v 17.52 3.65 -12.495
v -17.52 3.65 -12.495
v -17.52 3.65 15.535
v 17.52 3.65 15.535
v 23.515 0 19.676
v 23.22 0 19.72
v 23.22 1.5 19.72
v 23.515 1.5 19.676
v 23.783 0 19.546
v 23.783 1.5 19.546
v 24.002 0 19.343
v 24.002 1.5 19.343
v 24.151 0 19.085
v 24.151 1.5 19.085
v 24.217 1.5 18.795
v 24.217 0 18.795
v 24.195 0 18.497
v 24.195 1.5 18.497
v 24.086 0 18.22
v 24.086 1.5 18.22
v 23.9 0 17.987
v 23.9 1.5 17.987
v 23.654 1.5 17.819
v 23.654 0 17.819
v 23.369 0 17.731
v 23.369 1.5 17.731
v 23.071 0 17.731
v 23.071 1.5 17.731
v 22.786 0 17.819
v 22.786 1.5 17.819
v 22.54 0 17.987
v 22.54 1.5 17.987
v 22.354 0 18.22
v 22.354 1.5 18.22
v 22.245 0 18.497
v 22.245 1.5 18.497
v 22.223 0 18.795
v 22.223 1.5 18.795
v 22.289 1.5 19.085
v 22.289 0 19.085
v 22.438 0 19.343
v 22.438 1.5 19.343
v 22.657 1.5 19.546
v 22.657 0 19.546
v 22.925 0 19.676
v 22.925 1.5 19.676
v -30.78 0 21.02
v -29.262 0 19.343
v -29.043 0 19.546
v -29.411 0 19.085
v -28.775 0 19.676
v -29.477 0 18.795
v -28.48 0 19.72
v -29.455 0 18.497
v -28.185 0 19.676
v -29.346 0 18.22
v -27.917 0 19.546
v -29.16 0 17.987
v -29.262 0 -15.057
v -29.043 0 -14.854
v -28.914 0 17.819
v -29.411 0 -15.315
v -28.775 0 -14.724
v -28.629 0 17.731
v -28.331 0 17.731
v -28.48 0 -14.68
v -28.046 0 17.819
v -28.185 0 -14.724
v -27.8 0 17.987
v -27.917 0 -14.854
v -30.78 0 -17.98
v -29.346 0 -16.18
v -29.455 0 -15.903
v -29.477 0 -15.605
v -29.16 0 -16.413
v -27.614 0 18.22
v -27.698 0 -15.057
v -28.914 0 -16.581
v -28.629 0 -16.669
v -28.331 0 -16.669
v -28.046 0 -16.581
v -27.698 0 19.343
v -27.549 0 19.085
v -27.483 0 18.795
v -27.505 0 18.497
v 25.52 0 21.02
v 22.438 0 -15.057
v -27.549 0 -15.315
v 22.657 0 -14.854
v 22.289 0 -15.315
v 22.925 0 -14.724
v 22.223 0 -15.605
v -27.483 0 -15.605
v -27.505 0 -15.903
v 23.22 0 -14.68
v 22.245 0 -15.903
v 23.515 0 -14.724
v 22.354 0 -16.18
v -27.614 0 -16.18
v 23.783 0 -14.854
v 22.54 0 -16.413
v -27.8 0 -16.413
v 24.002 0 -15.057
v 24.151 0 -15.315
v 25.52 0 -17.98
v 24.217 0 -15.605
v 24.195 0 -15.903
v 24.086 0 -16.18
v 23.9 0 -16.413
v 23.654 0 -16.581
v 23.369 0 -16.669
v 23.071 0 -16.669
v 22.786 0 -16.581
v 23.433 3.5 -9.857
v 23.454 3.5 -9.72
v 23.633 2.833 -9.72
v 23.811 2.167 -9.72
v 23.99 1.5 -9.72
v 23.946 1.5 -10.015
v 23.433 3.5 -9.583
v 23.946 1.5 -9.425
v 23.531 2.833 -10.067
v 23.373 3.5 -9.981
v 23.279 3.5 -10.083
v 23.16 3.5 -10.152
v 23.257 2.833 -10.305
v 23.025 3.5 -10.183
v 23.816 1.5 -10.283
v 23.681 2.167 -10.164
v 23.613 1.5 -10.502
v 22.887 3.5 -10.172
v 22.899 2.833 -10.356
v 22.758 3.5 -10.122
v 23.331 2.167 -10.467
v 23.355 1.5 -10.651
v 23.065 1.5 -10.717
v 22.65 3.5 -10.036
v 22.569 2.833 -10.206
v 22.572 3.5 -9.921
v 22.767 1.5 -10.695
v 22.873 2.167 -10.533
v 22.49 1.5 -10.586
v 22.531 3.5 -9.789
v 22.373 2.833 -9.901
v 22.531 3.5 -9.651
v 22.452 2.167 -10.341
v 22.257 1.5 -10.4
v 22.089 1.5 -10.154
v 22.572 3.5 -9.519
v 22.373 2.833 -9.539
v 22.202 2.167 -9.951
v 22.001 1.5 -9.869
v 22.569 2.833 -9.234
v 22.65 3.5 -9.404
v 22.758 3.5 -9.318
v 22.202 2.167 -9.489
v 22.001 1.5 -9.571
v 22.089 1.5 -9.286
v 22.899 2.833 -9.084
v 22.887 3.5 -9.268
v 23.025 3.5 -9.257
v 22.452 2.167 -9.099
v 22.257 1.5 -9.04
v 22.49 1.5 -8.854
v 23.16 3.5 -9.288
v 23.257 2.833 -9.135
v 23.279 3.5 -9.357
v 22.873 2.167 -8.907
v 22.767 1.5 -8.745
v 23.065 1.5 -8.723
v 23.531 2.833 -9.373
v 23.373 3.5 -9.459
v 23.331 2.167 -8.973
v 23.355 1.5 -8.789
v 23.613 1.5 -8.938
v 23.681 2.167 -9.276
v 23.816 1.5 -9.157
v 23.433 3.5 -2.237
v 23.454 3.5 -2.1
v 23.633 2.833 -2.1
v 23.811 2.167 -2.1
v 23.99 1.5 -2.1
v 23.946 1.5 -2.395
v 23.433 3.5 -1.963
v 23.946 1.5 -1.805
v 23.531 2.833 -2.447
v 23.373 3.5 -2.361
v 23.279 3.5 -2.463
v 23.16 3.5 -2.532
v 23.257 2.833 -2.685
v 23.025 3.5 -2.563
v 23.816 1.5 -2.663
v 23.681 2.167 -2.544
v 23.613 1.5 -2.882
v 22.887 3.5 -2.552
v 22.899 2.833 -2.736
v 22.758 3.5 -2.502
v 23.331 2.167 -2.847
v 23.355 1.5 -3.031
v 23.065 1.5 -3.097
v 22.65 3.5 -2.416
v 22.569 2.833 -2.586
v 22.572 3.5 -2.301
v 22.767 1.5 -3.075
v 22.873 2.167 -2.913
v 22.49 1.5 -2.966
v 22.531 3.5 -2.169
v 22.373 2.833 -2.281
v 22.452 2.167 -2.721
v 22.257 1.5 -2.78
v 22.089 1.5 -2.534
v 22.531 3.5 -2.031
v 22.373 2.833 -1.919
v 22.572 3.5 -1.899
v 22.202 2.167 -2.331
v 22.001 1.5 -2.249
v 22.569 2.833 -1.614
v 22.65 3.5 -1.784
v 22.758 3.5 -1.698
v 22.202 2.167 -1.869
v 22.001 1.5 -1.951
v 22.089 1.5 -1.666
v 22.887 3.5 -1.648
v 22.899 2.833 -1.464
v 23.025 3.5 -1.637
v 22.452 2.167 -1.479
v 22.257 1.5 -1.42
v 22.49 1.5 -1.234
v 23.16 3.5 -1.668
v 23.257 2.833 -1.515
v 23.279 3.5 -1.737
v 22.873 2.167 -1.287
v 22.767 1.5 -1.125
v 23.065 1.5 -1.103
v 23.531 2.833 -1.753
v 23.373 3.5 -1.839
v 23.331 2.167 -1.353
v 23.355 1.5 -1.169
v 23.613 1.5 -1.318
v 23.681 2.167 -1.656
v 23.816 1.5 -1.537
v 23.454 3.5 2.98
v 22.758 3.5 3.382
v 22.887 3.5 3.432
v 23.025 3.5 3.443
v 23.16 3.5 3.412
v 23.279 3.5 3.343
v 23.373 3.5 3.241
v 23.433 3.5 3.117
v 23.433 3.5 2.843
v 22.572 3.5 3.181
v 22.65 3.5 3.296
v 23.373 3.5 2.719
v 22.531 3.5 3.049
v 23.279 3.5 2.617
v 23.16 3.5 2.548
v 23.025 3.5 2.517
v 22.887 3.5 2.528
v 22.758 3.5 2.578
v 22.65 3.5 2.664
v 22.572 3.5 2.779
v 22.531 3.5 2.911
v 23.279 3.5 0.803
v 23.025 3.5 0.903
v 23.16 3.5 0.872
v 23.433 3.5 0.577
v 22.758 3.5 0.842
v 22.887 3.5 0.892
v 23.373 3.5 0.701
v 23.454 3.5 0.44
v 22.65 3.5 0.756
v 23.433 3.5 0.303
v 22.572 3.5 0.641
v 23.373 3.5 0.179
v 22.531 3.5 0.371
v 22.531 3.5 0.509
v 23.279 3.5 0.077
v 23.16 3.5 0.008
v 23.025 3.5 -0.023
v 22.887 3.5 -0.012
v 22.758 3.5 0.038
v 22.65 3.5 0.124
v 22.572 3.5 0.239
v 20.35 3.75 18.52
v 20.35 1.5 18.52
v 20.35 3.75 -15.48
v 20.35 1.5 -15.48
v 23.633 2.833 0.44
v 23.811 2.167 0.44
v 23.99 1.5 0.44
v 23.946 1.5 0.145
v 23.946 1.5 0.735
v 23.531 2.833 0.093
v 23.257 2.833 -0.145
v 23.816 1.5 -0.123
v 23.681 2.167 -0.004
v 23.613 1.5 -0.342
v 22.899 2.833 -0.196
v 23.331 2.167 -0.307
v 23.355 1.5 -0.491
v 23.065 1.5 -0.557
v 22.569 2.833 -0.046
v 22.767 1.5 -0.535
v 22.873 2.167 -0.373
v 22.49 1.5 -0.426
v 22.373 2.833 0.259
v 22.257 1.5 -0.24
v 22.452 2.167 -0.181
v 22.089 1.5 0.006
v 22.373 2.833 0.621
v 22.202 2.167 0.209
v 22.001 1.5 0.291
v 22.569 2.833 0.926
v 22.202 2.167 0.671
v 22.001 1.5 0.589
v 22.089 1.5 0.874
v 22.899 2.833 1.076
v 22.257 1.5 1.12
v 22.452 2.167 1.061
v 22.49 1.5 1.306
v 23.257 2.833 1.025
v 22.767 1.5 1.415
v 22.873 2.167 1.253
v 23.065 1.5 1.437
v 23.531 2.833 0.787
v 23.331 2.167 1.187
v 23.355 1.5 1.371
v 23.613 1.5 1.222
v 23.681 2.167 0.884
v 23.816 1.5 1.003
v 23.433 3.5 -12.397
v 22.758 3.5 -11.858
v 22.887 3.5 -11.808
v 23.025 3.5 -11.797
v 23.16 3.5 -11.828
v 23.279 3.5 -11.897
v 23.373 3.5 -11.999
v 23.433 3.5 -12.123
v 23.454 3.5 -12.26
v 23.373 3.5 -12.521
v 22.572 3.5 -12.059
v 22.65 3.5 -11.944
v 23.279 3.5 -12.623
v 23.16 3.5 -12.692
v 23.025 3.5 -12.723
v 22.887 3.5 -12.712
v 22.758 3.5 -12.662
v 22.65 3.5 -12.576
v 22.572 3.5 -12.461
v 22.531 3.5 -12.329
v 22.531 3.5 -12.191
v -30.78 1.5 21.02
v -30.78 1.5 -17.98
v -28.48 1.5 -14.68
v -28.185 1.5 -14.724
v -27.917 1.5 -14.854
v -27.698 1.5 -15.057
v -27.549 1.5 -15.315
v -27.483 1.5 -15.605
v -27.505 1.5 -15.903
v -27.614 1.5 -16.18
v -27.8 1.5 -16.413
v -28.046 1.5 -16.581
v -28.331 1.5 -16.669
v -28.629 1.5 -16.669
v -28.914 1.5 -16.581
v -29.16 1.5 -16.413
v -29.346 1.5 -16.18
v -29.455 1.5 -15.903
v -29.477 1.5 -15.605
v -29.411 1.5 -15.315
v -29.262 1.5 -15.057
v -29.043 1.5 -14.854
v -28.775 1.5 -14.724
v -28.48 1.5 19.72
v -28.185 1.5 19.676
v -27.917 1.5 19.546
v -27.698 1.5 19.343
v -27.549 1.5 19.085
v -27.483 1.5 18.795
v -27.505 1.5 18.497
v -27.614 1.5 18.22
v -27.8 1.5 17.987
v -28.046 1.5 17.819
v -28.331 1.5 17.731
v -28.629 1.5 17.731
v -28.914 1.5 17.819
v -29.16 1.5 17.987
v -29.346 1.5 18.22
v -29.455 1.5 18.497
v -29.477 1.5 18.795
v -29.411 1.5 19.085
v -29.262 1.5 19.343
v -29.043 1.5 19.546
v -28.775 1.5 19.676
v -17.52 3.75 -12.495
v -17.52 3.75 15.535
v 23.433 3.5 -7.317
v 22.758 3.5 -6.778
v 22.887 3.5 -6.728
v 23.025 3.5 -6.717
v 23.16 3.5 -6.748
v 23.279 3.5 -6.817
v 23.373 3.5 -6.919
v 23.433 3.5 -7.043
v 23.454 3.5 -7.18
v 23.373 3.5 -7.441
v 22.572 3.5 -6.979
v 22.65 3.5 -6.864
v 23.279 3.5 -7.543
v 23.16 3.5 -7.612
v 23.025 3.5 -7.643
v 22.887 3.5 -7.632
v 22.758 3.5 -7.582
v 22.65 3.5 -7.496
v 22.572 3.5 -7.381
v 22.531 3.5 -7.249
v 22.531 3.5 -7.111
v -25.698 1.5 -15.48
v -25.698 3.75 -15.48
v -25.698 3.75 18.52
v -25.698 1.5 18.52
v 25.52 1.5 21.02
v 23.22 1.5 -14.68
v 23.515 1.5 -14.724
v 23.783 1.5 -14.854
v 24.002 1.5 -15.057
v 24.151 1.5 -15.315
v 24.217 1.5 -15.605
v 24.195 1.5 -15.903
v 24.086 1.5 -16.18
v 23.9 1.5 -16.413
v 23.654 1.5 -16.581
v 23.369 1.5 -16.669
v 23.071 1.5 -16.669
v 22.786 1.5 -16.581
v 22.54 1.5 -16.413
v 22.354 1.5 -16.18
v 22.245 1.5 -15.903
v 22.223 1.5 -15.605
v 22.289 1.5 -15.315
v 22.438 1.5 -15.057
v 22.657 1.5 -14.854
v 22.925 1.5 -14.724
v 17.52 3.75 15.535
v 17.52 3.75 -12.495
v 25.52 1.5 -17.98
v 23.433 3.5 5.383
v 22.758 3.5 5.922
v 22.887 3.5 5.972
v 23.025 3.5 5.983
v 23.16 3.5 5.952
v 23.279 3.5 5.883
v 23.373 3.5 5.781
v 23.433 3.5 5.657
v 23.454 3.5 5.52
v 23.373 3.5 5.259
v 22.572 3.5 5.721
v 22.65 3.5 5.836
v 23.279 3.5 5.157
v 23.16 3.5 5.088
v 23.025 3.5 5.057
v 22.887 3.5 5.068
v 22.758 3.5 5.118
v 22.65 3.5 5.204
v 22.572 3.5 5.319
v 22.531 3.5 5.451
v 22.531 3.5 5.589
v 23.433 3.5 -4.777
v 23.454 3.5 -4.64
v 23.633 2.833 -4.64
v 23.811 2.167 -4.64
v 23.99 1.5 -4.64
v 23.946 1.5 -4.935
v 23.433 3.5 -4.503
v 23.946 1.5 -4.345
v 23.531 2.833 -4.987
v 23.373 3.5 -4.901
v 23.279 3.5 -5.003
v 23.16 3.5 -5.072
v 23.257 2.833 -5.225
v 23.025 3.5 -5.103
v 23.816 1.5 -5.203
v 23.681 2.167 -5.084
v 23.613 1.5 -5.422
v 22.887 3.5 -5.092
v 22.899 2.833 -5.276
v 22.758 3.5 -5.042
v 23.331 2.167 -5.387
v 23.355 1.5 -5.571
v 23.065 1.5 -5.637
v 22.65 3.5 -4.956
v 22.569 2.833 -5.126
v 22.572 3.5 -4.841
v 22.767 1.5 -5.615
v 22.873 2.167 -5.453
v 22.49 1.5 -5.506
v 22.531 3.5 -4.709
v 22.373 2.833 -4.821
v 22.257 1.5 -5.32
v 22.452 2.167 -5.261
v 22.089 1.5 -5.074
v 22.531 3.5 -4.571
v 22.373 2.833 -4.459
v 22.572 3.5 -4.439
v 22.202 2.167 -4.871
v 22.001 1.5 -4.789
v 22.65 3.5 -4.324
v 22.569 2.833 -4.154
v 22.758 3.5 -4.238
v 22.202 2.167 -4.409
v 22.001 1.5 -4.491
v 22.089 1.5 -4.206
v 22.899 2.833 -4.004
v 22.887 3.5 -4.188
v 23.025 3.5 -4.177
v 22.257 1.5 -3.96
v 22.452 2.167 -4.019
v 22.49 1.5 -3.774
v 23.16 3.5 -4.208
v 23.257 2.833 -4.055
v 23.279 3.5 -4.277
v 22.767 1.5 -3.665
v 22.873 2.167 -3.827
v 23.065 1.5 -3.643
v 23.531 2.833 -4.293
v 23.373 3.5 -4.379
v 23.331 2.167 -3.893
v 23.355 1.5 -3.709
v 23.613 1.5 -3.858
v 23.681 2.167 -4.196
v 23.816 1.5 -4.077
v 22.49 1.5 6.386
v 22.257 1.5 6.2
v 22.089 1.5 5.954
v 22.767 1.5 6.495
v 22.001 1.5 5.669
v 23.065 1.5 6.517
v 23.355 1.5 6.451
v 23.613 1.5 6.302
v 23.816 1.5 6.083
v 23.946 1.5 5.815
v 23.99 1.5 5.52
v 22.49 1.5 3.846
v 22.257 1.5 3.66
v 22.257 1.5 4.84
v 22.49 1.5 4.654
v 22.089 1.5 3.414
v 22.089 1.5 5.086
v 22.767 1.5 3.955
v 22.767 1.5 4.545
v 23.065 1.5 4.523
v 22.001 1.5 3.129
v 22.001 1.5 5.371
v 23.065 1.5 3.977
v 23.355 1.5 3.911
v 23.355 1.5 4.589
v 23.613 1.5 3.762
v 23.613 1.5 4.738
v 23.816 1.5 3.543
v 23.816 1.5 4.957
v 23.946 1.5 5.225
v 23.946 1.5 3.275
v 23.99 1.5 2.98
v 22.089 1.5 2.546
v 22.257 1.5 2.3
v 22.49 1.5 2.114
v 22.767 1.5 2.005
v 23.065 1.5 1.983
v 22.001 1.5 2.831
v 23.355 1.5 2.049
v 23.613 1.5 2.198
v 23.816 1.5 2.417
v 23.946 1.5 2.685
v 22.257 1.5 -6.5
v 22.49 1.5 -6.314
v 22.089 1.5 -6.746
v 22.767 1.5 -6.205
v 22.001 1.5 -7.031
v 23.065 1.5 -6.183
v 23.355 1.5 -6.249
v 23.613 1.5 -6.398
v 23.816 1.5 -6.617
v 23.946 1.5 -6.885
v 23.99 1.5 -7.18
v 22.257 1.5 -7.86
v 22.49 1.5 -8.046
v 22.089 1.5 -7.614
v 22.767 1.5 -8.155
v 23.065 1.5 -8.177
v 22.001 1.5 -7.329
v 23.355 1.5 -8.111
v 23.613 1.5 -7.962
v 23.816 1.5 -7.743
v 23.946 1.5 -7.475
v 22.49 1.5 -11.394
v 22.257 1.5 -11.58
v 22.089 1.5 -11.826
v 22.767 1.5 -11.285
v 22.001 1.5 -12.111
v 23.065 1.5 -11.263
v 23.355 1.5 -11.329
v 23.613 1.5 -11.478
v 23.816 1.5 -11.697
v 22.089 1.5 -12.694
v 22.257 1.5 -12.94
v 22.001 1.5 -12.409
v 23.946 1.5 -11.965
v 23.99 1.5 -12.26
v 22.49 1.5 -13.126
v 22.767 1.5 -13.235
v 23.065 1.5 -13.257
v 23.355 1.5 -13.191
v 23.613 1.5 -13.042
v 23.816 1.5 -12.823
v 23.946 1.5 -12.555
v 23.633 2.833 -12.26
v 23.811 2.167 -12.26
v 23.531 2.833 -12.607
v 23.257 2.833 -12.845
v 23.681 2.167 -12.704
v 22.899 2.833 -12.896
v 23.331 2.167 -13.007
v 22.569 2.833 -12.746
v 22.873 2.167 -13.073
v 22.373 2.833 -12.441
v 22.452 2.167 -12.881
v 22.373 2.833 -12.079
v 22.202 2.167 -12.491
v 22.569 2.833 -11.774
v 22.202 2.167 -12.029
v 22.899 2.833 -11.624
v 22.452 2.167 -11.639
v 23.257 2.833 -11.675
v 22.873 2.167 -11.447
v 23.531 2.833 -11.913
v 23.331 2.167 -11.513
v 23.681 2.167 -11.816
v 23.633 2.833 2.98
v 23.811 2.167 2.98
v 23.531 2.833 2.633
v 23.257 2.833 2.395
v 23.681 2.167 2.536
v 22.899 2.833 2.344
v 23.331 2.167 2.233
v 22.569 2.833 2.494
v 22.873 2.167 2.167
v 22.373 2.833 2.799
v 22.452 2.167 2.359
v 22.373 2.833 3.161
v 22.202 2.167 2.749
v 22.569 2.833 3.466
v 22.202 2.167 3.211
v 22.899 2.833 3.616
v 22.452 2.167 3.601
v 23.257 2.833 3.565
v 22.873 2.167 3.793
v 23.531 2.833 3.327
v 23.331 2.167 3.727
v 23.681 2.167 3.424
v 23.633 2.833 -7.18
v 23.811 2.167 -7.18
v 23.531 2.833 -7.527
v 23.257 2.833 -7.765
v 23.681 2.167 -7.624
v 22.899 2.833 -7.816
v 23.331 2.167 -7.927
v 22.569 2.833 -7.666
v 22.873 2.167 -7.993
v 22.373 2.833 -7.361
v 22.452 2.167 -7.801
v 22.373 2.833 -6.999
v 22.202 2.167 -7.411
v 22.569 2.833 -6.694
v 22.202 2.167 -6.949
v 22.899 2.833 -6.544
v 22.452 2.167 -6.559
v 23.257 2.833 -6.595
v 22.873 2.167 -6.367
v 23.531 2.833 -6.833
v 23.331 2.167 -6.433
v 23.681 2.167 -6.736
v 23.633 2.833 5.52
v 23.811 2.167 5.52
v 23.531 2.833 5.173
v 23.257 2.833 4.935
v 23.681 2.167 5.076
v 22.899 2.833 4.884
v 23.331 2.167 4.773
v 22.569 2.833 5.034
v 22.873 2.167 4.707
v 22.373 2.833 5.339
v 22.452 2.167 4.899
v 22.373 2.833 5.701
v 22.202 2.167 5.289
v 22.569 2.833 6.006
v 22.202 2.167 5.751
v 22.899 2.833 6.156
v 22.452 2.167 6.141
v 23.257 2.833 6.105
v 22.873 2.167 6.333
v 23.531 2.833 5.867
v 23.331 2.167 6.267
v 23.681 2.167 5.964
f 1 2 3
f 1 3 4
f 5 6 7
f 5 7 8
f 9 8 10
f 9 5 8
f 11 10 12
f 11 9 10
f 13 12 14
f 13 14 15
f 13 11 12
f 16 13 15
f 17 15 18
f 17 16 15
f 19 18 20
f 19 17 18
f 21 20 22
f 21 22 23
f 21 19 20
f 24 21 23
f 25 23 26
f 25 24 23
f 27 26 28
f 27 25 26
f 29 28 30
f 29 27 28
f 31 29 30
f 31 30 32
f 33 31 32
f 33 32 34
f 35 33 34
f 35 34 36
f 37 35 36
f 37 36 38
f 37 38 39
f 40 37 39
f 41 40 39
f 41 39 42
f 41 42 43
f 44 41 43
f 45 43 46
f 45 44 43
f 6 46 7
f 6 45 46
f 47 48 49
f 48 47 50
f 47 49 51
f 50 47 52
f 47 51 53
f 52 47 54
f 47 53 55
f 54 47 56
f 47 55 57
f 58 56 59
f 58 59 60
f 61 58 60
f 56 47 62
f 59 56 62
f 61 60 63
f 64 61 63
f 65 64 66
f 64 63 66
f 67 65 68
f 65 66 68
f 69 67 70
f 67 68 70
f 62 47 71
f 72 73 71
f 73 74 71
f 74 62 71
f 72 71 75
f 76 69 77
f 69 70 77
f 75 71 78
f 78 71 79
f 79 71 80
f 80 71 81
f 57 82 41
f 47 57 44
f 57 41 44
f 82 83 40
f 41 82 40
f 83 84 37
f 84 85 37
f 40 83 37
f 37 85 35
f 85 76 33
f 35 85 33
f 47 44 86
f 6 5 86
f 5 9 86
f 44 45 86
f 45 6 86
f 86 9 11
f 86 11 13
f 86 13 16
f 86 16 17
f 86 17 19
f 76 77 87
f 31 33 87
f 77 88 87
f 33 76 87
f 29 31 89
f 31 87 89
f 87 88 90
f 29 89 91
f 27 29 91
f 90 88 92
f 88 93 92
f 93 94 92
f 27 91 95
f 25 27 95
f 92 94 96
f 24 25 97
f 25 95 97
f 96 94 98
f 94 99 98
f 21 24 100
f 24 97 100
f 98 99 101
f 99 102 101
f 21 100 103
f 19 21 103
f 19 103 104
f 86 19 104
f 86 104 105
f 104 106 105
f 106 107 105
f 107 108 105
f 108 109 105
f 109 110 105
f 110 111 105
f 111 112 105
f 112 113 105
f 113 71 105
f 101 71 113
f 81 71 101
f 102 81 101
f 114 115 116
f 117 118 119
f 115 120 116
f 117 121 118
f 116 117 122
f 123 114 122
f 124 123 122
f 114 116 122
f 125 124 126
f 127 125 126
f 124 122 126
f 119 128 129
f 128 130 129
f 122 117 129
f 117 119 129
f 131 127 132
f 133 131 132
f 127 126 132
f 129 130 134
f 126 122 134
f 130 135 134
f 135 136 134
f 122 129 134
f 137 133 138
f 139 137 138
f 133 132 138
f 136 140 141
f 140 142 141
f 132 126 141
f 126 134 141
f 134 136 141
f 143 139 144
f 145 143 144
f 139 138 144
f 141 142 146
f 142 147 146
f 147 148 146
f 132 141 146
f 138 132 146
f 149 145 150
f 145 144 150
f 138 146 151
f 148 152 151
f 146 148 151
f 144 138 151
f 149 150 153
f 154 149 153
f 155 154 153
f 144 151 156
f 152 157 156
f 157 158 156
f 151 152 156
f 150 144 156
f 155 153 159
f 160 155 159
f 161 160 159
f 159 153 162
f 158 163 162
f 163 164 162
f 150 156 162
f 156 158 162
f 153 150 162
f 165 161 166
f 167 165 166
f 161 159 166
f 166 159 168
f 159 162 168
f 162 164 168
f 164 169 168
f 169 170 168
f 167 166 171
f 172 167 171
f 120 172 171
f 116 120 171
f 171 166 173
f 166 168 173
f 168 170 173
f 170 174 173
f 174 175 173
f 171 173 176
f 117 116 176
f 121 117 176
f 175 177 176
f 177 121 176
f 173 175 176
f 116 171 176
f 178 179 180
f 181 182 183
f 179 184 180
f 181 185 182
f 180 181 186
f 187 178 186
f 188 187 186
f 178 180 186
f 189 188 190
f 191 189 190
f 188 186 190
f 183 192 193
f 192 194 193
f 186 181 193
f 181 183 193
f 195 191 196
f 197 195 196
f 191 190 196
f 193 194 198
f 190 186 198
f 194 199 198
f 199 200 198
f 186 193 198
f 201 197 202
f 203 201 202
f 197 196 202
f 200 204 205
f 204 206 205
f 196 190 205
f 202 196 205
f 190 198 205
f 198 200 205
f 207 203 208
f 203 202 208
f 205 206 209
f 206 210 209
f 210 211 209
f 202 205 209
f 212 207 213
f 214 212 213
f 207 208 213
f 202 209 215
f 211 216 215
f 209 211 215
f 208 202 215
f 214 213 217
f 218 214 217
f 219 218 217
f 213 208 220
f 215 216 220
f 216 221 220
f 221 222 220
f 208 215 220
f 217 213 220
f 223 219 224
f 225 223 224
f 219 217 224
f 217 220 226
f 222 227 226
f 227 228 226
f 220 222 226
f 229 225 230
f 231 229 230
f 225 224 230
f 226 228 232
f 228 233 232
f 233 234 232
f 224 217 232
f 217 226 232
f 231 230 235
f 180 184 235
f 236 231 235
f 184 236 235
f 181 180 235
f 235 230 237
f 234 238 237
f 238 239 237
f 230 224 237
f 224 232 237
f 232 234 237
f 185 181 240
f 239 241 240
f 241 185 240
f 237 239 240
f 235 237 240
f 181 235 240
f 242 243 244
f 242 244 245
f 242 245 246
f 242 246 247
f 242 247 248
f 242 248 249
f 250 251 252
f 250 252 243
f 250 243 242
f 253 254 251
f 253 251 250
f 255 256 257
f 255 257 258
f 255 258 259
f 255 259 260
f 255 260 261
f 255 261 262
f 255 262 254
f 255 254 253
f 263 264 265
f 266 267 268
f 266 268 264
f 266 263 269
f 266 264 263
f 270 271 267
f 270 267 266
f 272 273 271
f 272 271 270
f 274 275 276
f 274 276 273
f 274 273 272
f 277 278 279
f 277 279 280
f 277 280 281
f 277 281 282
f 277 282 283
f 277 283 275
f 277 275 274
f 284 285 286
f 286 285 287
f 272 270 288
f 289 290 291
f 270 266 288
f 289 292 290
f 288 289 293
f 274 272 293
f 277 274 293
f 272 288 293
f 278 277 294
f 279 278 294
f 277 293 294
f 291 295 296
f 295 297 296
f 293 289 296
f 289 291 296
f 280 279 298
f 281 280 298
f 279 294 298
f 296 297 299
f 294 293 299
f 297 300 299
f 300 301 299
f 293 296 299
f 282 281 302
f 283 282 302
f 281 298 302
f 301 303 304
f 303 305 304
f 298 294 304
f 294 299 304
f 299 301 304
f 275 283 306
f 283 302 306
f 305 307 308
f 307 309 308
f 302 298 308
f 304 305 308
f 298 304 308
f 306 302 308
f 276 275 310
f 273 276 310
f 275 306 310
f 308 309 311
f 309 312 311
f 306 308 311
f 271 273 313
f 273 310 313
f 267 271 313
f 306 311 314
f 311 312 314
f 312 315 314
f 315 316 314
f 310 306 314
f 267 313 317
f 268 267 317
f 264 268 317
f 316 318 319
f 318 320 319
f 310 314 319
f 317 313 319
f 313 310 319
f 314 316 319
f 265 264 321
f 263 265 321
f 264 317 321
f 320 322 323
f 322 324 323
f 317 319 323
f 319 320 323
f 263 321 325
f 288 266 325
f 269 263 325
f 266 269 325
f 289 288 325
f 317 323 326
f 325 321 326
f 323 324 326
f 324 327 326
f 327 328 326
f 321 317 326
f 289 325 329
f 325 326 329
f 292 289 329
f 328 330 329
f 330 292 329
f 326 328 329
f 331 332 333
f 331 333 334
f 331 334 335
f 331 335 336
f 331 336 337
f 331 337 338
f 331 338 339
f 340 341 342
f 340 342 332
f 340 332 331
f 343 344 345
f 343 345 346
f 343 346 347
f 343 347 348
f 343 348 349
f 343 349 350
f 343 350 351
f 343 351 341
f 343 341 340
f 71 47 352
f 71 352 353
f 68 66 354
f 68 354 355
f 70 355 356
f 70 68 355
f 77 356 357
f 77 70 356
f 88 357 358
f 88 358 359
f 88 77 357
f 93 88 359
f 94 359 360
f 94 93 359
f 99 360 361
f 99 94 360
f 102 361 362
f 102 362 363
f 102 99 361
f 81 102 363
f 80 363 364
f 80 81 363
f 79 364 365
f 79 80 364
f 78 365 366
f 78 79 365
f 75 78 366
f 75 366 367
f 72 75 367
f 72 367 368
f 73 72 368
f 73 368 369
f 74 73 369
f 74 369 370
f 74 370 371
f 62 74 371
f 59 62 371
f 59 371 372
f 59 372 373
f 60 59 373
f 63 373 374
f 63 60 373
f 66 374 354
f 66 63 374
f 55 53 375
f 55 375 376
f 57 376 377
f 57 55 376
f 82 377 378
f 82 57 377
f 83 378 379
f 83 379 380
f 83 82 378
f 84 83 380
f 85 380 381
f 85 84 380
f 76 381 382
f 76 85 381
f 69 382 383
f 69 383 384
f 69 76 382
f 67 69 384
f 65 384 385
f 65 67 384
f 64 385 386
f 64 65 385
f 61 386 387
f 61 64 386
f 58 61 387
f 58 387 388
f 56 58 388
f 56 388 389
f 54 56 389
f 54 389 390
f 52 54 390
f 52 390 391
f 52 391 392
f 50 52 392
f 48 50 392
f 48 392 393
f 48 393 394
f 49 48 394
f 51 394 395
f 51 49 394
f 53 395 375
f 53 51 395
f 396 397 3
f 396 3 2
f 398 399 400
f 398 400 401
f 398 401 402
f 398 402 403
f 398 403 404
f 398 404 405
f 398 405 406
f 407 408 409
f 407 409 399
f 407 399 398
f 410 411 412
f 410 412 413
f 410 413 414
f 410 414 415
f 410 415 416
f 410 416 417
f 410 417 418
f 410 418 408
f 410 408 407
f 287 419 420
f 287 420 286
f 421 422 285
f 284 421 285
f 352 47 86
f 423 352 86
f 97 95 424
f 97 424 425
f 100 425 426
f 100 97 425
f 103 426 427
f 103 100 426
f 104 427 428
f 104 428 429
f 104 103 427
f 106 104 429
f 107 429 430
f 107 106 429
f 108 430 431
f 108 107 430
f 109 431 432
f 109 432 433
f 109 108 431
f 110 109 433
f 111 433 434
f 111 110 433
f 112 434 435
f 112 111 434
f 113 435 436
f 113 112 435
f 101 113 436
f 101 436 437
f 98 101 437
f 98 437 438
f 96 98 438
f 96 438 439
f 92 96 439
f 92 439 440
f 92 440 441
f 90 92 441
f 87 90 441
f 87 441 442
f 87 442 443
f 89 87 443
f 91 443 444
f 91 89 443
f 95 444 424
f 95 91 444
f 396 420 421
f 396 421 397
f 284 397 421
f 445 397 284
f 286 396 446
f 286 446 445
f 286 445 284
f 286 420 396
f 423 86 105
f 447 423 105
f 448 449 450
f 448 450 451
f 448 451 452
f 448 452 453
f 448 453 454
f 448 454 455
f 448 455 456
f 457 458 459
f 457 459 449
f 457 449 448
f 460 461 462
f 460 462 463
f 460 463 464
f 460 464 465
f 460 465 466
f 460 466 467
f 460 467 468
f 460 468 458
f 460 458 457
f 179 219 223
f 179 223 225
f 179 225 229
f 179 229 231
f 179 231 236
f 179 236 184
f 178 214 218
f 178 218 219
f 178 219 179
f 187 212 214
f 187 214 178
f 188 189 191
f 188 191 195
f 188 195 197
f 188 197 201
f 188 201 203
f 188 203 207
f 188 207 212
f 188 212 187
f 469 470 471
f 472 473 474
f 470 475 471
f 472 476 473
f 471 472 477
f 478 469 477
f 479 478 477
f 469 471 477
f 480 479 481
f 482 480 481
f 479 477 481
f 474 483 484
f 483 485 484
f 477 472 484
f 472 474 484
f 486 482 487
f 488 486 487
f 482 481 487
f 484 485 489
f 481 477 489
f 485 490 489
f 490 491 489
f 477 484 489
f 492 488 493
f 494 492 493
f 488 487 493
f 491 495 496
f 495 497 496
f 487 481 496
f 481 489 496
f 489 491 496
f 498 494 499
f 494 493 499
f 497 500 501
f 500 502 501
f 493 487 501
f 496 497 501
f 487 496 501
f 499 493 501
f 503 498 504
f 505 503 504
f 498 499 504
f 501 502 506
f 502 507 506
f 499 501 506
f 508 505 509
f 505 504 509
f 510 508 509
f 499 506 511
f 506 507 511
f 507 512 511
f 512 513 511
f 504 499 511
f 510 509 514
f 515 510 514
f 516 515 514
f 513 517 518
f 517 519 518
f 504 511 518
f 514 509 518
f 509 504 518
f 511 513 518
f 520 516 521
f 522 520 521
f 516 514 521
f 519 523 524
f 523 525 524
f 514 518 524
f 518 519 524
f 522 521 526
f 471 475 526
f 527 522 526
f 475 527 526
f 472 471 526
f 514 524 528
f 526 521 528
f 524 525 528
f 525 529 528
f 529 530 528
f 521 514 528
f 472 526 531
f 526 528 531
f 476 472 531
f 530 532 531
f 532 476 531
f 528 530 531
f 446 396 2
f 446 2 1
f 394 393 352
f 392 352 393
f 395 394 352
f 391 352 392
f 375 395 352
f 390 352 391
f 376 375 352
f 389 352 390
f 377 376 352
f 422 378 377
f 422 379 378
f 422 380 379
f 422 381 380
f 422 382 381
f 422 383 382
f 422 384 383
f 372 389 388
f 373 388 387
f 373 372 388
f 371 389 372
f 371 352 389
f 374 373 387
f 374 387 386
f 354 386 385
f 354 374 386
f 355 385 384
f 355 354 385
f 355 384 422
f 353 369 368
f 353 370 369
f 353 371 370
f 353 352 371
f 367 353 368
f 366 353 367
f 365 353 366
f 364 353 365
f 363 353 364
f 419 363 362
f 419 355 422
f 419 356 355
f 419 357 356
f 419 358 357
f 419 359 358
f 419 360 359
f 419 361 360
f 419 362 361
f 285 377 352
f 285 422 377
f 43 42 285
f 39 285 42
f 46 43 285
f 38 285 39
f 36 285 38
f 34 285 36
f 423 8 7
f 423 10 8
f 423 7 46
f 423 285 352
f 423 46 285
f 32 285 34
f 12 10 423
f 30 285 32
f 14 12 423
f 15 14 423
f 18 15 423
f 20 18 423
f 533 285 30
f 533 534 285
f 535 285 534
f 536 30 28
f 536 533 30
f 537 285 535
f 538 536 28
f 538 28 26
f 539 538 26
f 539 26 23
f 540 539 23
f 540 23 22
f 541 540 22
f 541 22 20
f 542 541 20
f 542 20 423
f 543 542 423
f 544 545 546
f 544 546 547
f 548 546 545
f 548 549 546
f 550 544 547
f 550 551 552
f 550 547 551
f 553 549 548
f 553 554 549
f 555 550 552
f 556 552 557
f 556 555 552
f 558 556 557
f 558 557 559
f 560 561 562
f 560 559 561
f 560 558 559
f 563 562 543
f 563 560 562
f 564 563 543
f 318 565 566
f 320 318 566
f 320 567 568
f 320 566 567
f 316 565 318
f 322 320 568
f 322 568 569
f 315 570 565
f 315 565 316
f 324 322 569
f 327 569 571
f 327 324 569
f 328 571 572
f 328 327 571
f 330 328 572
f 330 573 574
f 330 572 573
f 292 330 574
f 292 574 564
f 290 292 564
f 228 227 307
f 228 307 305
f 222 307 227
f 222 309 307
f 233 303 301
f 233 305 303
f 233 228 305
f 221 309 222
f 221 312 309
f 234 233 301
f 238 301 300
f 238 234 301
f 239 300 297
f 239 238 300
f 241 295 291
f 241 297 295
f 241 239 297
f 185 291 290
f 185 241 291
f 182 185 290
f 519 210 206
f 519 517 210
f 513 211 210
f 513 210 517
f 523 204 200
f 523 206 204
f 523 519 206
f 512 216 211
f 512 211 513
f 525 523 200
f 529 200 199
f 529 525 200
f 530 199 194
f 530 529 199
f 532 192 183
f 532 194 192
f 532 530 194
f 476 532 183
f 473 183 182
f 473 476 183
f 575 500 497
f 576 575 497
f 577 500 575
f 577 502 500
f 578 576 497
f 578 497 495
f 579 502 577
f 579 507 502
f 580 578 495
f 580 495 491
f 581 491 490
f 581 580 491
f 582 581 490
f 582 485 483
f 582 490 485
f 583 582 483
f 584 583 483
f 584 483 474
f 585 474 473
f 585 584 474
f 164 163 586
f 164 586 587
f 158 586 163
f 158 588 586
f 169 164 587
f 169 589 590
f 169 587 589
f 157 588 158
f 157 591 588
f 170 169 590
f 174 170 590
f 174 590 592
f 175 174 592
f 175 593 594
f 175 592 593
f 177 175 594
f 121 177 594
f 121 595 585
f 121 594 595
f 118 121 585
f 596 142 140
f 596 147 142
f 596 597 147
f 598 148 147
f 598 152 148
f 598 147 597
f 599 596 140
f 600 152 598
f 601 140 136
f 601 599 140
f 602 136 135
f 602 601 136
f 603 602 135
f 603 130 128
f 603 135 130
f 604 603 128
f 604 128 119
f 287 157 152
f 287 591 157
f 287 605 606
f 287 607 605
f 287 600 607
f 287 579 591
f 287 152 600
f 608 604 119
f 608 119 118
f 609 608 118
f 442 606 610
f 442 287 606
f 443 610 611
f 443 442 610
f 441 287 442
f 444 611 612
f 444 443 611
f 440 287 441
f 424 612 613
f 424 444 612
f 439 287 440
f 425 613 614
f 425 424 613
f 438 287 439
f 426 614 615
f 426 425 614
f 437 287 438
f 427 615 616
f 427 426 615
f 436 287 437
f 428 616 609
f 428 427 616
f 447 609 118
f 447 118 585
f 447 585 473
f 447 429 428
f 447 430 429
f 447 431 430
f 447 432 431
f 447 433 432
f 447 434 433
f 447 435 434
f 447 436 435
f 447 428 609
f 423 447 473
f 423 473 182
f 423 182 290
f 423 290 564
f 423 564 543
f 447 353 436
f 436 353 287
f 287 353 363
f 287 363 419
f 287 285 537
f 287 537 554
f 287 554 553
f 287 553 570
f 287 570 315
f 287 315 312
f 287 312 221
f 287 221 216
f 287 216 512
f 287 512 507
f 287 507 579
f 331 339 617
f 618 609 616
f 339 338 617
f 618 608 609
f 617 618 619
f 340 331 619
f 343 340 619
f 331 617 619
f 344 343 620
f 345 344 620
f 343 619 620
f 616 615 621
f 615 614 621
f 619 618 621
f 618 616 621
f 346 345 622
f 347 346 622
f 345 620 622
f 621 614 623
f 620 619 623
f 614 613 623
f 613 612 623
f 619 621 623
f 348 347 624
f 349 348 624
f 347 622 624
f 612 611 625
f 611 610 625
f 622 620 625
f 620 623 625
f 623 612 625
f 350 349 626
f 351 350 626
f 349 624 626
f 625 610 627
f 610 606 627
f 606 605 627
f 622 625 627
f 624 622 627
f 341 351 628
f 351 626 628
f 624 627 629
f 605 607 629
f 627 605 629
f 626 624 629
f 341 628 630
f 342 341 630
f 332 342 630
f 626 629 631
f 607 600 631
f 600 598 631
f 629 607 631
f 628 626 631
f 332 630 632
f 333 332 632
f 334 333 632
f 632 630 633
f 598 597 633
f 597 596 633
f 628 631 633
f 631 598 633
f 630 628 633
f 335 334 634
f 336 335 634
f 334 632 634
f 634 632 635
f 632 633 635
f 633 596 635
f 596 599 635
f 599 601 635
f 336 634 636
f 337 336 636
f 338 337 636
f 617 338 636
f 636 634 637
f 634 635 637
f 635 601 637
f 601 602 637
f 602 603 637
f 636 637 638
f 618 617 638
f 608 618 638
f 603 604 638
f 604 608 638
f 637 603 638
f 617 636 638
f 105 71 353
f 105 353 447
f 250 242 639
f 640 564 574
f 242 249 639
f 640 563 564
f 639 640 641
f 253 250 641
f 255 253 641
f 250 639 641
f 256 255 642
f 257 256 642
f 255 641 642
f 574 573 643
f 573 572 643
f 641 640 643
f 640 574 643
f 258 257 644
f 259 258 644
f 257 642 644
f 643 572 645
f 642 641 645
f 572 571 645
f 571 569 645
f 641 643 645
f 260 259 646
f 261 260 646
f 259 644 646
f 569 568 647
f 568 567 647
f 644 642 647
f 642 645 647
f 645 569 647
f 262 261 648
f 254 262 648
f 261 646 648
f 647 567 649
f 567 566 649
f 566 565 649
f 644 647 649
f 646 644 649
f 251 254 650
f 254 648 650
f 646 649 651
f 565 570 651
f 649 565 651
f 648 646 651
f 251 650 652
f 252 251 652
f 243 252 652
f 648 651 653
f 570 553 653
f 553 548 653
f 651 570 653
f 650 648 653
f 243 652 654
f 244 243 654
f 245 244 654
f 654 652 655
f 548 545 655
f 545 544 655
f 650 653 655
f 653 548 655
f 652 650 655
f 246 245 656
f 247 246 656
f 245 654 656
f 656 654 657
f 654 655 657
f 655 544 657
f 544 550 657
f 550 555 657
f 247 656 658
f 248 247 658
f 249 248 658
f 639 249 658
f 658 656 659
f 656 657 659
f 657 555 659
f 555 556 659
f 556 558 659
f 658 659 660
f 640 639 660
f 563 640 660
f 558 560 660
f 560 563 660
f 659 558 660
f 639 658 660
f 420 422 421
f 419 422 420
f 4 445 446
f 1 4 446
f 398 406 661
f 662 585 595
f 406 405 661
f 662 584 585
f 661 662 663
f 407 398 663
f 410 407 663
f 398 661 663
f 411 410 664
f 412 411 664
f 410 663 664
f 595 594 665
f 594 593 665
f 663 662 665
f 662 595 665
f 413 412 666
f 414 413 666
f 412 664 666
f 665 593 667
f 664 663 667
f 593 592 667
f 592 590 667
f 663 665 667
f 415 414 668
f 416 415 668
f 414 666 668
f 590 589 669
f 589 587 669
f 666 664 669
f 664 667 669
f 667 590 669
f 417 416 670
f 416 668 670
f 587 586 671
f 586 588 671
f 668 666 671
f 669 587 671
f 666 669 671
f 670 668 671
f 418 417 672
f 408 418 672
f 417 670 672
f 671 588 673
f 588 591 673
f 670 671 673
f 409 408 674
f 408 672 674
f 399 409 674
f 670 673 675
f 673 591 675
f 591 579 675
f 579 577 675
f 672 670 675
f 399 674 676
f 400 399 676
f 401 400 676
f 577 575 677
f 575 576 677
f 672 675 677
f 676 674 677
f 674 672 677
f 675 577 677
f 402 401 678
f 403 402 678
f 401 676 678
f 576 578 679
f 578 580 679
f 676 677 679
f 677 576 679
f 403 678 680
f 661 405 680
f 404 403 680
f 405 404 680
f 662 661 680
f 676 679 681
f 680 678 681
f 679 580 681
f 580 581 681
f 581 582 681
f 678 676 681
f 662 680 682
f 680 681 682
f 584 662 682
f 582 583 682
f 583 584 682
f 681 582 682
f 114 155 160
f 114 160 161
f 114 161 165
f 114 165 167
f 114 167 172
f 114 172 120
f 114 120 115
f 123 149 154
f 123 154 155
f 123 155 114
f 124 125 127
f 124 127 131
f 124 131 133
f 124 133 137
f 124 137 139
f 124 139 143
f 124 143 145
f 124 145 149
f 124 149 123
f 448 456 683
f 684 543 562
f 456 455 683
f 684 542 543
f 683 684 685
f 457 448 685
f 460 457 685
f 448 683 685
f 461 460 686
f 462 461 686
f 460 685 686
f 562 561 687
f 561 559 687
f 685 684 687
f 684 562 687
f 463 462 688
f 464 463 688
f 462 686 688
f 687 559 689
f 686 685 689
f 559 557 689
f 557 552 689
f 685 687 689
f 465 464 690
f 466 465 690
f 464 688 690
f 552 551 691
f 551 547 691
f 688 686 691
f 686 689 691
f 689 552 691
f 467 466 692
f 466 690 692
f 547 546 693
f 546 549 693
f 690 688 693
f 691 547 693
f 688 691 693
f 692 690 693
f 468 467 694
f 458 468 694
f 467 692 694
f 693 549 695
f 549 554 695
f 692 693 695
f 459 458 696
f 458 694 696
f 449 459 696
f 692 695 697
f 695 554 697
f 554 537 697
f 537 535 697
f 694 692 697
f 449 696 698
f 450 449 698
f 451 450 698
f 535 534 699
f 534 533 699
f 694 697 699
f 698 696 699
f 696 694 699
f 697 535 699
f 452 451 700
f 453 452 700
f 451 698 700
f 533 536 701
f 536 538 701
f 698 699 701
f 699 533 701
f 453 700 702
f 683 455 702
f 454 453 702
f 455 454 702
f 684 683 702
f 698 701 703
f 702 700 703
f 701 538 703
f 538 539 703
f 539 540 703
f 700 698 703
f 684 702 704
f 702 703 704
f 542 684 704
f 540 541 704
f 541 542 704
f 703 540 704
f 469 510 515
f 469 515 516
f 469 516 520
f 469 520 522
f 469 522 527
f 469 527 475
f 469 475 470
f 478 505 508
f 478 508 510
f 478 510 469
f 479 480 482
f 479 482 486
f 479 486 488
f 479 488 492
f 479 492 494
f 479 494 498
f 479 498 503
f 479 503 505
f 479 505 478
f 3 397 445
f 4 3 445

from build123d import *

# Parameters (mm, degrees)
SKETCH_1_W                = 56.3
SKETCH_1_H                = 39
SKETCH_1_R                = 1
EXTRUDE_1_DEPTH           = 1.5
SKETCH_2_W                = 46.047970844
SKETCH_2_H                = 34
EXTRUDE_2_DEPTH           = 2.25
SKETCH_3_W                = 35.04
SKETCH_3_H                = 28.03
CUT_EXTRUDE_1_DEPTH       = 0.1
SKETCH_5_R                = 1
EXTRUDE_4_DEPTH           = 2
EXTRUDE_4_DRAFT           = 15
EXTRUDE_4_PROFILE_2_DEPTH = 2
EXTRUDE_4_PROFILE_2_DRAFT = 15
EXTRUDE_4_PROFILE_3_DEPTH = 2
EXTRUDE_4_PROFILE_3_DRAFT = 15
EXTRUDE_4_PROFILE_4_DEPTH = 2
EXTRUDE_4_PROFILE_4_DRAFT = 15
EXTRUDE_4_PROFILE_5_DEPTH = 2
EXTRUDE_4_PROFILE_5_DRAFT = 15
EXTRUDE_4_PROFILE_6_DEPTH = 2
EXTRUDE_4_PROFILE_6_DRAFT = 15
EXTRUDE_4_PROFILE_7_DEPTH = 2
EXTRUDE_4_PROFILE_7_DRAFT = 15
EXTRUDE_4_PROFILE_8_DEPTH = 2
EXTRUDE_4_PROFILE_8_DRAFT = 15


with BuildPart() as part:
    # Эскиз1 → Бобышка-Вытянуть1 (new body)
    with BuildSketch(Plane(origin=(0, 0, 0), x_dir=(1, 0, 0), z_dir=(0, 1, 0))):
        with Locations((-2.63, -1.52)):
            Rectangle(SKETCH_1_W, SKETCH_1_H)
        with Locations(Location((-28.48, 15.68, 0), (0, 0, 270))):
            Circle(SKETCH_1_R, mode=Mode.SUBTRACT)
        with Locations(Location((23.22, 15.68, 0), (0, 0, 270))):
            Circle(SKETCH_1_R, mode=Mode.SUBTRACT)
        with Locations(Location((-28.48, -18.72, 0), (0, 0, 270))):
            Circle(SKETCH_1_R, mode=Mode.SUBTRACT)
        with Locations(Location((23.22, -18.72, 0), (0, 0, 270))):
            Circle(SKETCH_1_R, mode=Mode.SUBTRACT)
    extrude(amount=EXTRUDE_1_DEPTH)

    # Эскиз2 → Бобышка-Вытянуть2 (add)
    with BuildSketch(Plane(origin=(0, 1.5, 0), x_dir=(1, 0, 0), z_dir=(0, 1, 0))):
        with Locations((-2.673985422, -1.52)):
            Rectangle(SKETCH_2_W, SKETCH_2_H)
    extrude(amount=EXTRUDE_2_DEPTH)

    # Эскиз3 → Вырез-Вытянуть1 (cut)
    with BuildSketch(Plane(origin=(0, 3.75, 0), x_dir=(1, 0, 0), z_dir=(0, 1, 0))):
        with Locations((0, -1.52)):
            Rectangle(SKETCH_3_W, SKETCH_3_H)
    extrude(amount=-CUT_EXTRUDE_1_DEPTH, mode=Mode.SUBTRACT)


with BuildPart() as extrude_4_tool:
    # Эскиз5 → Бобышка-Вытянуть4 (with draft: the straight prism first)
    with BuildSketch(Plane(origin=(0, 1.5, 0), x_dir=(1, 0, 0), z_dir=(0, 1, 0))):
        with Locations((22.99, 12.26)):
            Circle(SKETCH_5_R)
    extrude(amount=EXTRUDE_4_DEPTH)
    # Бобышка-Вытянуть4: the draft: its side faces are tilted about the plane it starts from
    extrude_4_sides = [extrude_4_tool.faces().sort_by_distance(p)[0] for p in [
        (21.99, 2.5, -12.26),
    ]]
    draft(extrude_4_sides, Plane(origin=(0, 1.5, 0), x_dir=(1, 0, 0), z_dir=(0, 1, 0)), EXTRUDE_4_DRAFT)


with BuildPart() as part_1:
    add(part.part)

    # Бобышка-Вытянуть4: add extrude_4_tool
    add(extrude_4_tool.part)


with BuildPart() as extrude_4_profile_2_tool:
    # Эскиз5 → Бобышка-Вытянуть4 profile 2 (with draft: the straight prism first)
    with BuildSketch(Plane(origin=(0, 1.5, 0), x_dir=(1, 0, 0), z_dir=(0, 1, 0))):
        with Locations((22.99, 9.72)):
            Circle(SKETCH_5_R)
    extrude(amount=EXTRUDE_4_PROFILE_2_DEPTH)
    # Бобышка-Вытянуть4 profile 2: the draft: its side faces are tilted about the plane it starts from
    extrude_4_profile_2_sides = [extrude_4_profile_2_tool.faces().sort_by_distance(p)[0] for p in [
        (21.99, 2.5, -9.72),
    ]]
    draft(extrude_4_profile_2_sides, Plane(origin=(0, 1.5, 0), x_dir=(1, 0, 0), z_dir=(0, 1, 0)), EXTRUDE_4_PROFILE_2_DRAFT)


with BuildPart() as part_2:
    add(part_1.part)

    # Бобышка-Вытянуть4 profile 2: add extrude_4_profile_2_tool
    add(extrude_4_profile_2_tool.part)


with BuildPart() as extrude_4_profile_3_tool:
    # Эскиз5 → Бобышка-Вытянуть4 profile 3 (with draft: the straight prism first)
    with BuildSketch(Plane(origin=(0, 1.5, 0), x_dir=(1, 0, 0), z_dir=(0, 1, 0))):
        with Locations((22.99, 7.18)):
            Circle(SKETCH_5_R)
    extrude(amount=EXTRUDE_4_PROFILE_3_DEPTH)
    # Бобышка-Вытянуть4 profile 3: the draft: its side faces are tilted about the plane it starts from
    extrude_4_profile_3_sides = [extrude_4_profile_3_tool.faces().sort_by_distance(p)[0] for p in [
        (21.99, 2.5, -7.18),
    ]]
    draft(extrude_4_profile_3_sides, Plane(origin=(0, 1.5, 0), x_dir=(1, 0, 0), z_dir=(0, 1, 0)), EXTRUDE_4_PROFILE_3_DRAFT)


with BuildPart() as part_3:
    add(part_2.part)

    # Бобышка-Вытянуть4 profile 3: add extrude_4_profile_3_tool
    add(extrude_4_profile_3_tool.part)


with BuildPart() as extrude_4_profile_4_tool:
    # Эскиз5 → Бобышка-Вытянуть4 profile 4 (with draft: the straight prism first)
    with BuildSketch(Plane(origin=(0, 1.5, 0), x_dir=(1, 0, 0), z_dir=(0, 1, 0))):
        with Locations((22.99, 4.64)):
            Circle(SKETCH_5_R)
    extrude(amount=EXTRUDE_4_PROFILE_4_DEPTH)
    # Бобышка-Вытянуть4 profile 4: the draft: its side faces are tilted about the plane it starts from
    extrude_4_profile_4_sides = [extrude_4_profile_4_tool.faces().sort_by_distance(p)[0] for p in [
        (21.99, 2.5, -4.64),
    ]]
    draft(extrude_4_profile_4_sides, Plane(origin=(0, 1.5, 0), x_dir=(1, 0, 0), z_dir=(0, 1, 0)), EXTRUDE_4_PROFILE_4_DRAFT)


with BuildPart() as part_4:
    add(part_3.part)

    # Бобышка-Вытянуть4 profile 4: add extrude_4_profile_4_tool
    add(extrude_4_profile_4_tool.part)


with BuildPart() as extrude_4_profile_5_tool:
    # Эскиз5 → Бобышка-Вытянуть4 profile 5 (with draft: the straight prism first)
    with BuildSketch(Plane(origin=(0, 1.5, 0), x_dir=(1, 0, 0), z_dir=(0, 1, 0))):
        with Locations((22.99, 2.1)):
            Circle(SKETCH_5_R)
    extrude(amount=EXTRUDE_4_PROFILE_5_DEPTH)
    # Бобышка-Вытянуть4 profile 5: the draft: its side faces are tilted about the plane it starts from
    extrude_4_profile_5_sides = [extrude_4_profile_5_tool.faces().sort_by_distance(p)[0] for p in [
        (21.99, 2.5, -2.1),
    ]]
    draft(extrude_4_profile_5_sides, Plane(origin=(0, 1.5, 0), x_dir=(1, 0, 0), z_dir=(0, 1, 0)), EXTRUDE_4_PROFILE_5_DRAFT)


with BuildPart() as part_5:
    add(part_4.part)

    # Бобышка-Вытянуть4 profile 5: add extrude_4_profile_5_tool
    add(extrude_4_profile_5_tool.part)


with BuildPart() as extrude_4_profile_6_tool:
    # Эскиз5 → Бобышка-Вытянуть4 profile 6 (with draft: the straight prism first)
    with BuildSketch(Plane(origin=(0, 1.5, 0), x_dir=(1, 0, 0), z_dir=(0, 1, 0))):
        with Locations((22.99, -0.44)):
            Circle(SKETCH_5_R)
    extrude(amount=EXTRUDE_4_PROFILE_6_DEPTH)
    # Бобышка-Вытянуть4 profile 6: the draft: its side faces are tilted about the plane it starts from
    extrude_4_profile_6_sides = [extrude_4_profile_6_tool.faces().sort_by_distance(p)[0] for p in [
        (21.99, 2.5, 0.44),
    ]]
    draft(extrude_4_profile_6_sides, Plane(origin=(0, 1.5, 0), x_dir=(1, 0, 0), z_dir=(0, 1, 0)), EXTRUDE_4_PROFILE_6_DRAFT)


with BuildPart() as part_6:
    add(part_5.part)

    # Бобышка-Вытянуть4 profile 6: add extrude_4_profile_6_tool
    add(extrude_4_profile_6_tool.part)


with BuildPart() as extrude_4_profile_7_tool:
    # Эскиз5 → Бобышка-Вытянуть4 profile 7 (with draft: the straight prism first)
    with BuildSketch(Plane(origin=(0, 1.5, 0), x_dir=(1, 0, 0), z_dir=(0, 1, 0))):
        with Locations((22.99, -2.98)):
            Circle(SKETCH_5_R)
    extrude(amount=EXTRUDE_4_PROFILE_7_DEPTH)
    # Бобышка-Вытянуть4 profile 7: the draft: its side faces are tilted about the plane it starts from
    extrude_4_profile_7_sides = [extrude_4_profile_7_tool.faces().sort_by_distance(p)[0] for p in [
        (21.99, 2.5, 2.98),
    ]]
    draft(extrude_4_profile_7_sides, Plane(origin=(0, 1.5, 0), x_dir=(1, 0, 0), z_dir=(0, 1, 0)), EXTRUDE_4_PROFILE_7_DRAFT)


with BuildPart() as part_7:
    add(part_6.part)

    # Бобышка-Вытянуть4 profile 7: add extrude_4_profile_7_tool
    add(extrude_4_profile_7_tool.part)


with BuildPart() as extrude_4_profile_8_tool:
    # Эскиз5 → Бобышка-Вытянуть4 profile 8 (with draft: the straight prism first)
    with BuildSketch(Plane(origin=(0, 1.5, 0), x_dir=(1, 0, 0), z_dir=(0, 1, 0))):
        with Locations((22.99, -5.52)):
            Circle(SKETCH_5_R)
    extrude(amount=EXTRUDE_4_PROFILE_8_DEPTH)
    # Бобышка-Вытянуть4 profile 8: the draft: its side faces are tilted about the plane it starts from
    extrude_4_profile_8_sides = [extrude_4_profile_8_tool.faces().sort_by_distance(p)[0] for p in [
        (21.99, 2.5, 5.52),
    ]]
    draft(extrude_4_profile_8_sides, Plane(origin=(0, 1.5, 0), x_dir=(1, 0, 0), z_dir=(0, 1, 0)), EXTRUDE_4_PROFILE_8_DRAFT)


with BuildPart() as part_8:
    add(part_7.part)

    # Бобышка-Вытянуть4 profile 8: add extrude_4_profile_8_tool
    add(extrude_4_profile_8_tool.part)


solid = part_8.part
